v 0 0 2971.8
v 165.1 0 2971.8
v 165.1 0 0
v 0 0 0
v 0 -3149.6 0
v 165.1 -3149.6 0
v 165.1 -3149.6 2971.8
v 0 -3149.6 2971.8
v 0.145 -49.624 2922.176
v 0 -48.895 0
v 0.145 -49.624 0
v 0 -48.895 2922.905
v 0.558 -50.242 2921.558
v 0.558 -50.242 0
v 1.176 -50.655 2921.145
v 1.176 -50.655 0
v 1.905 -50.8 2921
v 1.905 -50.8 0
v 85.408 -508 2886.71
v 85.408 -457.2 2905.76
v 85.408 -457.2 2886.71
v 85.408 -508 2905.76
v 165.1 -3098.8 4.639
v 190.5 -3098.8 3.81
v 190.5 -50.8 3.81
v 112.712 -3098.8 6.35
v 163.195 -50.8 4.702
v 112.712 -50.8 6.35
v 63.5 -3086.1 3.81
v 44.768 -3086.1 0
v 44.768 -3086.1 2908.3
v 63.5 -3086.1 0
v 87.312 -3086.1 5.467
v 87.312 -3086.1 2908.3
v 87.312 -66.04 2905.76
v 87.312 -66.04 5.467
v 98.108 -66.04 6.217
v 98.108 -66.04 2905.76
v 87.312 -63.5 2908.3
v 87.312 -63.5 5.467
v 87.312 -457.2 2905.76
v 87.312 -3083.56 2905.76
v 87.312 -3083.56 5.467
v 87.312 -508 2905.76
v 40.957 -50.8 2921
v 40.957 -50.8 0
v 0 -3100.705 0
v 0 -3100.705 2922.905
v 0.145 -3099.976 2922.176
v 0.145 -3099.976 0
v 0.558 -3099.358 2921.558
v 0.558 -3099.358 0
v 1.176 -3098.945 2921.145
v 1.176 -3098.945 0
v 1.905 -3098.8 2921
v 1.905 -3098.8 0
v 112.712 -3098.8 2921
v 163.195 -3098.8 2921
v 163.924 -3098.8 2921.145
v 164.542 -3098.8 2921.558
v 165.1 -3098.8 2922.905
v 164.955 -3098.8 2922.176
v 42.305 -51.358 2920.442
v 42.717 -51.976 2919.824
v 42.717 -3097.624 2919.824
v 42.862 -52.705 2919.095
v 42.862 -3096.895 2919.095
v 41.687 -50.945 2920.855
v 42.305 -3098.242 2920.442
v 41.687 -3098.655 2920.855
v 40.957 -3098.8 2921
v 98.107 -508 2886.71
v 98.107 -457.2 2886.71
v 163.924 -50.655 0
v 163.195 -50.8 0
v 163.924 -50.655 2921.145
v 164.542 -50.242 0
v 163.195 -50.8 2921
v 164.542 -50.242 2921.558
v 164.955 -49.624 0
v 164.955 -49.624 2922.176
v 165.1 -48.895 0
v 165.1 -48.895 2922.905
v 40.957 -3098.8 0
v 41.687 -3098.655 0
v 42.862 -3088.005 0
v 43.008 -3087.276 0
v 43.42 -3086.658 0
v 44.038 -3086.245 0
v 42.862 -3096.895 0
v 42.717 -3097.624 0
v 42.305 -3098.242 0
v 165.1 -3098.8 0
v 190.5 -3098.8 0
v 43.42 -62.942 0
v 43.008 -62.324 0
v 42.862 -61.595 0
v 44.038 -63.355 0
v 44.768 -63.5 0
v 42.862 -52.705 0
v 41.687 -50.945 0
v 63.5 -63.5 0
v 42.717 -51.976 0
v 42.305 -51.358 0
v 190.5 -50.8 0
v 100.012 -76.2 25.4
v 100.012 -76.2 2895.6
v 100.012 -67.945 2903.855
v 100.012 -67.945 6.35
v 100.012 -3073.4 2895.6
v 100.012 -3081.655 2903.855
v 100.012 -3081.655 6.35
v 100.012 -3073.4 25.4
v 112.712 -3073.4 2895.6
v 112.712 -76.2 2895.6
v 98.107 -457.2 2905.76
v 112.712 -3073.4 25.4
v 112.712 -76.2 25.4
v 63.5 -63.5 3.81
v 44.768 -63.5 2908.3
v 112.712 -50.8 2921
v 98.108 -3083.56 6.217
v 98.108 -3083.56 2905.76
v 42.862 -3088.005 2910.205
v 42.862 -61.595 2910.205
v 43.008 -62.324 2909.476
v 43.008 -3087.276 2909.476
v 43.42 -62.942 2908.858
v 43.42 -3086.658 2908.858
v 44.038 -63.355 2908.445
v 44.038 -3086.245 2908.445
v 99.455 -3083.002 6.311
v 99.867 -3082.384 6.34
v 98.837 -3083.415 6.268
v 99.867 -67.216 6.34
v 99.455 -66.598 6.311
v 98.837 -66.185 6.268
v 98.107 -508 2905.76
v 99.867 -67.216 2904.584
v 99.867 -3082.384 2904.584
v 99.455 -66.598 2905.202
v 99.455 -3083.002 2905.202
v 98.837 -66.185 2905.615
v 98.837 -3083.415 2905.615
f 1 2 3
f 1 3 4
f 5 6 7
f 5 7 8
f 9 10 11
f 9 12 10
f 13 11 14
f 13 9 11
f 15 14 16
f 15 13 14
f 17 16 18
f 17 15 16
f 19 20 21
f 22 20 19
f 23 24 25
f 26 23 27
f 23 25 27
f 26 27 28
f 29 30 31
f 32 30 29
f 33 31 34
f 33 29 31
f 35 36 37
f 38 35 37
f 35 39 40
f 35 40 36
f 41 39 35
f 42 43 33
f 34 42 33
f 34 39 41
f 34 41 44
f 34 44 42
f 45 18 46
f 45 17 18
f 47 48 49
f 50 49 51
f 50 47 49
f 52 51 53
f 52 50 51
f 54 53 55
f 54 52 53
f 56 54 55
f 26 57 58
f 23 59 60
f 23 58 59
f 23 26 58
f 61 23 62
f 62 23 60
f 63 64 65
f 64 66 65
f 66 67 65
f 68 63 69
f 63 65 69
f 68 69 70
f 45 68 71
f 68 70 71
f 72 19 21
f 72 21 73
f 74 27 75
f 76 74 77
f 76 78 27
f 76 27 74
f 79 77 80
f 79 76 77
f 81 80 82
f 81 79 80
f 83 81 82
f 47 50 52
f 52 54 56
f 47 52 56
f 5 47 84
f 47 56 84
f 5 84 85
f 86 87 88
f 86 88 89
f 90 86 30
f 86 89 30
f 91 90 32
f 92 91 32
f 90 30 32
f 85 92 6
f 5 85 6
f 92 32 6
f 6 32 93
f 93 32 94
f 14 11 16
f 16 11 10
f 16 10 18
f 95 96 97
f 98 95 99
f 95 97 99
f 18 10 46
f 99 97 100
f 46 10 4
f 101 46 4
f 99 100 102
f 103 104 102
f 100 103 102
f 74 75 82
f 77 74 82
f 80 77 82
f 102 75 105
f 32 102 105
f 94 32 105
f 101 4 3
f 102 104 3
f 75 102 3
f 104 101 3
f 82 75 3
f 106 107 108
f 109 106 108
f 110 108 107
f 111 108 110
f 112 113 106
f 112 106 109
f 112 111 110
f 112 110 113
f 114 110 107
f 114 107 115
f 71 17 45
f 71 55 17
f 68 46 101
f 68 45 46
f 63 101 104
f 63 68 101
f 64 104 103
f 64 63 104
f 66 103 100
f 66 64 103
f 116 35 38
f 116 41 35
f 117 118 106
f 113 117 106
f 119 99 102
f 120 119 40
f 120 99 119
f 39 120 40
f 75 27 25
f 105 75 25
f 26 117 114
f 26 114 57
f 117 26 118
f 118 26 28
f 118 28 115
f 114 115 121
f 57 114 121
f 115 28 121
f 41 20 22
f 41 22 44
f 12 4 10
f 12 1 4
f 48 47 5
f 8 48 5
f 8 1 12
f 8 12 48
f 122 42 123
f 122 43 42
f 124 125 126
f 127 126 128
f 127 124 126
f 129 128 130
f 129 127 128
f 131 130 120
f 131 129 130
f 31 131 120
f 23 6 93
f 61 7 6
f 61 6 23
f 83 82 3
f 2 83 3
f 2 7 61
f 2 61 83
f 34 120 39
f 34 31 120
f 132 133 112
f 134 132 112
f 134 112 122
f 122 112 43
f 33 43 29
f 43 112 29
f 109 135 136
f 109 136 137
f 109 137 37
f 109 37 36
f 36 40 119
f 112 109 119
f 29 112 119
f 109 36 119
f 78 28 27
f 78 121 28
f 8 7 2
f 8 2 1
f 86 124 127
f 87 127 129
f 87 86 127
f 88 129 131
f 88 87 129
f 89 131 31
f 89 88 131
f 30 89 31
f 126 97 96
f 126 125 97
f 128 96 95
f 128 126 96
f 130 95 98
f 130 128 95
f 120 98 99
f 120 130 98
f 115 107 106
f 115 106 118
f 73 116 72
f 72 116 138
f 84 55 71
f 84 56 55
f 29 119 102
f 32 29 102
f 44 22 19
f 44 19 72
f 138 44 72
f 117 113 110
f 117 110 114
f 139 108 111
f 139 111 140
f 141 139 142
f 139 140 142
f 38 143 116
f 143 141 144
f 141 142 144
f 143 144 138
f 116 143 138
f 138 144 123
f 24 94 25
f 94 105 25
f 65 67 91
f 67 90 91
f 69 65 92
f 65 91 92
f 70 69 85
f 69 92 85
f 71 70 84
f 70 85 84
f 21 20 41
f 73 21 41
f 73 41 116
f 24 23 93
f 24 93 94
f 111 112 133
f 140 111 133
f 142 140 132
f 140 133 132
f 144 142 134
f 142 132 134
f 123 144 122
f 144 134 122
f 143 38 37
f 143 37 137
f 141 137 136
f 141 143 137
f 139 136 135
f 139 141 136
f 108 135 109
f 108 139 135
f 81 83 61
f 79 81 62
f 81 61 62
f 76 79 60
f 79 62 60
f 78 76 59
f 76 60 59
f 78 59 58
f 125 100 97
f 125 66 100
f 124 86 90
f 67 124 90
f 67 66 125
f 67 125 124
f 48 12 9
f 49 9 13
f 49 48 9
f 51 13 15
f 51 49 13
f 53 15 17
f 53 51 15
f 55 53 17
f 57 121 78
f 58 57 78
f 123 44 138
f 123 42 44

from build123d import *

# Parameters (mm, degrees)
F3_R          = 1.905
F6_DEPTH      = 1524
F6_DEPTH_BACK = 1524
F7_W          = 12.7
F7_H          = 50.8
F8_DEPTH      = 19.05


with BuildPart() as f2:
    # F2: sweep along a path in F1
    with BuildLine(Plane.YZ) as f2_path:
        Line((-50.8, 0), (-50.8, 2921))
        Line((-50.8, 2921), (-3098.8, 2921))
        Line((-3098.8, 2921), (-3098.8, 0))
    # F0 (on Top) → F2 (sweep)
    with BuildSketch(Plane.XY):
        Polygon((165.1, 0), (0, 0), (0, -50.8), (42.8625, -50.8), (42.8625, -63.5), (87.3125, -63.5), (87.3125, -66.04), (100.0125, -66.04), (100.0125, -76.2), (112.7125, -76.2), (112.7125, -50.8), (165.1, -50.8), align=None)
    sweep(path=f2_path.line, transition=Transition.RIGHT)

    # F3
    f3_edges = [f2.edges().sort_by_distance(p)[0] for p in [
        (0, -50.8, 1460.5),
        (42.8625, -50.8, 1460.5),
        (42.8625, -63.5, 1454.15),
        (165.1, -50.8, 1460.5),
        (165.1, -1574.8, 2921),
        (0, -1574.8, 2921),
        (42.8625, -1574.8, 2921),
        (42.8625, -1574.8, 2908.3),
        (0, -3098.8, 1460.5),
        (42.8625, -3098.8, 1460.5),
        (42.8625, -3086.1, 1454.15),
        (100.0125, -3083.56, 1452.88),
        (100.0125, -1574.8, 2905.76),
        (100.0125, -66.04, 1452.88),
    ]]
    fillet(f3_edges, radius=F3_R)

    # F5 (on mid) → F6 (join, two sides)
    with BuildSketch(Plane.XZ.offset(1574.8)) as f6_sk:
        Polygon((63.5, 3.81), (63.5, 0), (190.5, 0), (190.5, 3.81), (112.7125, 6.35), (112.7125, 25.4), (100.0125, 25.4), (100.0125, 6.35), align=None)
    extrude(amount=-F6_DEPTH)
    extrude(f6_sk.sketch, amount=F6_DEPTH_BACK)

    # F7 (on face) → F8 (join)
    with BuildSketch(Plane(origin=(0, 0, 2905.76), x_dir=(1, 0, 0), z_dir=(0, 0, -1))):
        with Locations((91.7575, 482.6)):
            Rectangle(F7_W, F7_H)
    extrude(amount=F8_DEPTH)


solid = f2.part
